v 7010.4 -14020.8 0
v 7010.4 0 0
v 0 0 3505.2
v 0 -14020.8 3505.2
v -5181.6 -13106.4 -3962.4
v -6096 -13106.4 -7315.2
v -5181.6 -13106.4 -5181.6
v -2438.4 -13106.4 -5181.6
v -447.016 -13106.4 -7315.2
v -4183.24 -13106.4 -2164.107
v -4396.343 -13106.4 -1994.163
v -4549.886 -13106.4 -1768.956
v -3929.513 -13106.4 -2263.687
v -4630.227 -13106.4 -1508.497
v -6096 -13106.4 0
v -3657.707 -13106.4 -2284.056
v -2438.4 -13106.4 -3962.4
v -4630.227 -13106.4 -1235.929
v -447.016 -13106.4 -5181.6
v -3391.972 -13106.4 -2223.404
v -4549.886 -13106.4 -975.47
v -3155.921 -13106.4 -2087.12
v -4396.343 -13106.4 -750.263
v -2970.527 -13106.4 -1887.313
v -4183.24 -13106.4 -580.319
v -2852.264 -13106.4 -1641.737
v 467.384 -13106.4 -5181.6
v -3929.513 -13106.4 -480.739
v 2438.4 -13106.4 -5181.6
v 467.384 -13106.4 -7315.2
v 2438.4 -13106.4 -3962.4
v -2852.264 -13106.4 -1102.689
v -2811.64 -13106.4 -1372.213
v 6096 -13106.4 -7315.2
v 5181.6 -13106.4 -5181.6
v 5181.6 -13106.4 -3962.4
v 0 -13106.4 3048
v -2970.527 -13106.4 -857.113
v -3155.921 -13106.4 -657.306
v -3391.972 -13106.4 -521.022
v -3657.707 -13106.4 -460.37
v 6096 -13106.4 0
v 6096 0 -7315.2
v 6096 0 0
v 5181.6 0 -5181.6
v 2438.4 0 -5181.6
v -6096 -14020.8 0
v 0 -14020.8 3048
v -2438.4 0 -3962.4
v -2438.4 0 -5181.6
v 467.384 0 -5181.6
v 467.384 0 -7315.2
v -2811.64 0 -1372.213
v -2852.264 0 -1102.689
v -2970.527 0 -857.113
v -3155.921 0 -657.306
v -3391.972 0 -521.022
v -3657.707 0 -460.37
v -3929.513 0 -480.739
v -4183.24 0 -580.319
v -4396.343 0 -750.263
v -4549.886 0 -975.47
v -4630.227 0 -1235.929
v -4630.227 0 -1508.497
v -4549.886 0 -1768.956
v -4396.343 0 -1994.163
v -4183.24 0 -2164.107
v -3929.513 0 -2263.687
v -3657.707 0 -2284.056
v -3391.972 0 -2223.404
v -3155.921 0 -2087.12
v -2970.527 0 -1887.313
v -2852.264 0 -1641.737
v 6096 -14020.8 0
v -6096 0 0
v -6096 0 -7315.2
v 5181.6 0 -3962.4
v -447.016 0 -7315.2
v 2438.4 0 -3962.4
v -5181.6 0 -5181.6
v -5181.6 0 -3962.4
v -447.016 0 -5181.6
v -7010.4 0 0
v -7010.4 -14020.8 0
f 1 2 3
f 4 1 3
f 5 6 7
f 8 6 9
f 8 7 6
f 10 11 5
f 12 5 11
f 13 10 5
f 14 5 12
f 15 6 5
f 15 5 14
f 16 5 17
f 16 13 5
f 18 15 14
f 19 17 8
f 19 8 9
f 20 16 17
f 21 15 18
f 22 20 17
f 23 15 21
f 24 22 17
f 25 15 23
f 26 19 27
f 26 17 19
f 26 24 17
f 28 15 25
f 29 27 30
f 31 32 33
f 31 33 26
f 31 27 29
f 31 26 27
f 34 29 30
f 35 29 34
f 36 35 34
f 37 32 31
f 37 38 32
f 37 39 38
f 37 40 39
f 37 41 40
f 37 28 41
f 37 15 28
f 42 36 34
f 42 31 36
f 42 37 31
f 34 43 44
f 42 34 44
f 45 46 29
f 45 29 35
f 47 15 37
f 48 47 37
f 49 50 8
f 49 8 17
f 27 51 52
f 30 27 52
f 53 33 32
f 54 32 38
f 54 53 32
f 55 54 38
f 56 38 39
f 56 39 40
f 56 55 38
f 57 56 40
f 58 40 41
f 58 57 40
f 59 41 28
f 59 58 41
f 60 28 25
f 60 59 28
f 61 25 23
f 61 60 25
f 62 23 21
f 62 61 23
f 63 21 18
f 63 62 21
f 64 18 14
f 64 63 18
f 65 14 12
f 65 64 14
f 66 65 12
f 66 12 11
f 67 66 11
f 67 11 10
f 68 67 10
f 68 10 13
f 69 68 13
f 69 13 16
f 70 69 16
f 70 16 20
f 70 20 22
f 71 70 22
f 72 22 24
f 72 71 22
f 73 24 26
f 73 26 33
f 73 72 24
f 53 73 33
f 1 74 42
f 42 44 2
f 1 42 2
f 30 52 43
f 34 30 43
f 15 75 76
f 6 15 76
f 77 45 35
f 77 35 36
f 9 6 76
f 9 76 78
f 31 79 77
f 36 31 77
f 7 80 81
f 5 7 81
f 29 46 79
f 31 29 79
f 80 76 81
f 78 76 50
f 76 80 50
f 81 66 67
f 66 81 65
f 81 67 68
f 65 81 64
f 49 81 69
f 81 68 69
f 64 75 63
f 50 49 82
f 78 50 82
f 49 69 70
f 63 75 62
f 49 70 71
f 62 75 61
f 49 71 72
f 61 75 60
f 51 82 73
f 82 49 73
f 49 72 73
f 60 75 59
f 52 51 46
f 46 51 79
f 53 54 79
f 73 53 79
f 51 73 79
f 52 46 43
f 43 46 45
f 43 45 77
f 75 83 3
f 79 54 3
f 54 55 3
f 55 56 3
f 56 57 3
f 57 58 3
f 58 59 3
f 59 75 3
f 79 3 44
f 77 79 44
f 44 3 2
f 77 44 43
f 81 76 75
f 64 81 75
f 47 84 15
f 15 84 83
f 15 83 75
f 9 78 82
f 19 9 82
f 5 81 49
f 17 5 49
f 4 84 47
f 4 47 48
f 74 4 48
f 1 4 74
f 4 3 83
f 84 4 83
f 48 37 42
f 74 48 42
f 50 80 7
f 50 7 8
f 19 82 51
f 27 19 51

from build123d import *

# Parameters (mm, degrees)
F1_DEPTH = 14020.8
F2_DEPTH = 13106.4
F0_W     = 2743.2
F0_H     = 1219.2
F0_R     = 914.4
F3_DEPTH = 13106.4


# Not quite as in the source:
# - the program builds the solid bodies; features that only make, move or delete a surface that nothing else refers to are left out


with BuildPart() as f1:
    # F0 (on Front) → F1 (new body)
    with BuildSketch(Plane.XZ):
        Polygon((-7010.4, 0), (-6096, 0), (0, 3048), (0, 3505.2), align=None)
        Polygon((0, 3048), (6096, 0), (7010.4, 0), (0, 3505.2), align=None)
    extrude(amount=F1_DEPTH)

    # F0 (on Front) → F2 (join)
    with BuildSketch(Plane.XZ):
        Polygon((-6096, 0), (0, 0), (6096, 0), (0, 3048), align=None)
    extrude(amount=F2_DEPTH)

    # F0 (on Front) → F3 (join)
    with BuildSketch(Plane.XZ):
        Polygon((6096, 0), (0, 0), (-6096, 0), (-6096, -7315.2), (-447.0156319439, -7315.2), (-447.0156319439, -5181.6), (467.3843680561, -5181.6), (467.3843680561, -7315.2), (6096, -7315.2), align=None)
        with Locations((-3810, -4572)):
            Rectangle(F0_W, F0_H, mode=Mode.SUBTRACT)
        with Locations((3810, -4572)):
            Rectangle(F0_W, F0_H, mode=Mode.SUBTRACT)
        with Locations((-3726.0398864746, -1372.2128868103)):
            Circle(F0_R, mode=Mode.SUBTRACT)
    extrude(amount=F3_DEPTH)


solid = f1.part
